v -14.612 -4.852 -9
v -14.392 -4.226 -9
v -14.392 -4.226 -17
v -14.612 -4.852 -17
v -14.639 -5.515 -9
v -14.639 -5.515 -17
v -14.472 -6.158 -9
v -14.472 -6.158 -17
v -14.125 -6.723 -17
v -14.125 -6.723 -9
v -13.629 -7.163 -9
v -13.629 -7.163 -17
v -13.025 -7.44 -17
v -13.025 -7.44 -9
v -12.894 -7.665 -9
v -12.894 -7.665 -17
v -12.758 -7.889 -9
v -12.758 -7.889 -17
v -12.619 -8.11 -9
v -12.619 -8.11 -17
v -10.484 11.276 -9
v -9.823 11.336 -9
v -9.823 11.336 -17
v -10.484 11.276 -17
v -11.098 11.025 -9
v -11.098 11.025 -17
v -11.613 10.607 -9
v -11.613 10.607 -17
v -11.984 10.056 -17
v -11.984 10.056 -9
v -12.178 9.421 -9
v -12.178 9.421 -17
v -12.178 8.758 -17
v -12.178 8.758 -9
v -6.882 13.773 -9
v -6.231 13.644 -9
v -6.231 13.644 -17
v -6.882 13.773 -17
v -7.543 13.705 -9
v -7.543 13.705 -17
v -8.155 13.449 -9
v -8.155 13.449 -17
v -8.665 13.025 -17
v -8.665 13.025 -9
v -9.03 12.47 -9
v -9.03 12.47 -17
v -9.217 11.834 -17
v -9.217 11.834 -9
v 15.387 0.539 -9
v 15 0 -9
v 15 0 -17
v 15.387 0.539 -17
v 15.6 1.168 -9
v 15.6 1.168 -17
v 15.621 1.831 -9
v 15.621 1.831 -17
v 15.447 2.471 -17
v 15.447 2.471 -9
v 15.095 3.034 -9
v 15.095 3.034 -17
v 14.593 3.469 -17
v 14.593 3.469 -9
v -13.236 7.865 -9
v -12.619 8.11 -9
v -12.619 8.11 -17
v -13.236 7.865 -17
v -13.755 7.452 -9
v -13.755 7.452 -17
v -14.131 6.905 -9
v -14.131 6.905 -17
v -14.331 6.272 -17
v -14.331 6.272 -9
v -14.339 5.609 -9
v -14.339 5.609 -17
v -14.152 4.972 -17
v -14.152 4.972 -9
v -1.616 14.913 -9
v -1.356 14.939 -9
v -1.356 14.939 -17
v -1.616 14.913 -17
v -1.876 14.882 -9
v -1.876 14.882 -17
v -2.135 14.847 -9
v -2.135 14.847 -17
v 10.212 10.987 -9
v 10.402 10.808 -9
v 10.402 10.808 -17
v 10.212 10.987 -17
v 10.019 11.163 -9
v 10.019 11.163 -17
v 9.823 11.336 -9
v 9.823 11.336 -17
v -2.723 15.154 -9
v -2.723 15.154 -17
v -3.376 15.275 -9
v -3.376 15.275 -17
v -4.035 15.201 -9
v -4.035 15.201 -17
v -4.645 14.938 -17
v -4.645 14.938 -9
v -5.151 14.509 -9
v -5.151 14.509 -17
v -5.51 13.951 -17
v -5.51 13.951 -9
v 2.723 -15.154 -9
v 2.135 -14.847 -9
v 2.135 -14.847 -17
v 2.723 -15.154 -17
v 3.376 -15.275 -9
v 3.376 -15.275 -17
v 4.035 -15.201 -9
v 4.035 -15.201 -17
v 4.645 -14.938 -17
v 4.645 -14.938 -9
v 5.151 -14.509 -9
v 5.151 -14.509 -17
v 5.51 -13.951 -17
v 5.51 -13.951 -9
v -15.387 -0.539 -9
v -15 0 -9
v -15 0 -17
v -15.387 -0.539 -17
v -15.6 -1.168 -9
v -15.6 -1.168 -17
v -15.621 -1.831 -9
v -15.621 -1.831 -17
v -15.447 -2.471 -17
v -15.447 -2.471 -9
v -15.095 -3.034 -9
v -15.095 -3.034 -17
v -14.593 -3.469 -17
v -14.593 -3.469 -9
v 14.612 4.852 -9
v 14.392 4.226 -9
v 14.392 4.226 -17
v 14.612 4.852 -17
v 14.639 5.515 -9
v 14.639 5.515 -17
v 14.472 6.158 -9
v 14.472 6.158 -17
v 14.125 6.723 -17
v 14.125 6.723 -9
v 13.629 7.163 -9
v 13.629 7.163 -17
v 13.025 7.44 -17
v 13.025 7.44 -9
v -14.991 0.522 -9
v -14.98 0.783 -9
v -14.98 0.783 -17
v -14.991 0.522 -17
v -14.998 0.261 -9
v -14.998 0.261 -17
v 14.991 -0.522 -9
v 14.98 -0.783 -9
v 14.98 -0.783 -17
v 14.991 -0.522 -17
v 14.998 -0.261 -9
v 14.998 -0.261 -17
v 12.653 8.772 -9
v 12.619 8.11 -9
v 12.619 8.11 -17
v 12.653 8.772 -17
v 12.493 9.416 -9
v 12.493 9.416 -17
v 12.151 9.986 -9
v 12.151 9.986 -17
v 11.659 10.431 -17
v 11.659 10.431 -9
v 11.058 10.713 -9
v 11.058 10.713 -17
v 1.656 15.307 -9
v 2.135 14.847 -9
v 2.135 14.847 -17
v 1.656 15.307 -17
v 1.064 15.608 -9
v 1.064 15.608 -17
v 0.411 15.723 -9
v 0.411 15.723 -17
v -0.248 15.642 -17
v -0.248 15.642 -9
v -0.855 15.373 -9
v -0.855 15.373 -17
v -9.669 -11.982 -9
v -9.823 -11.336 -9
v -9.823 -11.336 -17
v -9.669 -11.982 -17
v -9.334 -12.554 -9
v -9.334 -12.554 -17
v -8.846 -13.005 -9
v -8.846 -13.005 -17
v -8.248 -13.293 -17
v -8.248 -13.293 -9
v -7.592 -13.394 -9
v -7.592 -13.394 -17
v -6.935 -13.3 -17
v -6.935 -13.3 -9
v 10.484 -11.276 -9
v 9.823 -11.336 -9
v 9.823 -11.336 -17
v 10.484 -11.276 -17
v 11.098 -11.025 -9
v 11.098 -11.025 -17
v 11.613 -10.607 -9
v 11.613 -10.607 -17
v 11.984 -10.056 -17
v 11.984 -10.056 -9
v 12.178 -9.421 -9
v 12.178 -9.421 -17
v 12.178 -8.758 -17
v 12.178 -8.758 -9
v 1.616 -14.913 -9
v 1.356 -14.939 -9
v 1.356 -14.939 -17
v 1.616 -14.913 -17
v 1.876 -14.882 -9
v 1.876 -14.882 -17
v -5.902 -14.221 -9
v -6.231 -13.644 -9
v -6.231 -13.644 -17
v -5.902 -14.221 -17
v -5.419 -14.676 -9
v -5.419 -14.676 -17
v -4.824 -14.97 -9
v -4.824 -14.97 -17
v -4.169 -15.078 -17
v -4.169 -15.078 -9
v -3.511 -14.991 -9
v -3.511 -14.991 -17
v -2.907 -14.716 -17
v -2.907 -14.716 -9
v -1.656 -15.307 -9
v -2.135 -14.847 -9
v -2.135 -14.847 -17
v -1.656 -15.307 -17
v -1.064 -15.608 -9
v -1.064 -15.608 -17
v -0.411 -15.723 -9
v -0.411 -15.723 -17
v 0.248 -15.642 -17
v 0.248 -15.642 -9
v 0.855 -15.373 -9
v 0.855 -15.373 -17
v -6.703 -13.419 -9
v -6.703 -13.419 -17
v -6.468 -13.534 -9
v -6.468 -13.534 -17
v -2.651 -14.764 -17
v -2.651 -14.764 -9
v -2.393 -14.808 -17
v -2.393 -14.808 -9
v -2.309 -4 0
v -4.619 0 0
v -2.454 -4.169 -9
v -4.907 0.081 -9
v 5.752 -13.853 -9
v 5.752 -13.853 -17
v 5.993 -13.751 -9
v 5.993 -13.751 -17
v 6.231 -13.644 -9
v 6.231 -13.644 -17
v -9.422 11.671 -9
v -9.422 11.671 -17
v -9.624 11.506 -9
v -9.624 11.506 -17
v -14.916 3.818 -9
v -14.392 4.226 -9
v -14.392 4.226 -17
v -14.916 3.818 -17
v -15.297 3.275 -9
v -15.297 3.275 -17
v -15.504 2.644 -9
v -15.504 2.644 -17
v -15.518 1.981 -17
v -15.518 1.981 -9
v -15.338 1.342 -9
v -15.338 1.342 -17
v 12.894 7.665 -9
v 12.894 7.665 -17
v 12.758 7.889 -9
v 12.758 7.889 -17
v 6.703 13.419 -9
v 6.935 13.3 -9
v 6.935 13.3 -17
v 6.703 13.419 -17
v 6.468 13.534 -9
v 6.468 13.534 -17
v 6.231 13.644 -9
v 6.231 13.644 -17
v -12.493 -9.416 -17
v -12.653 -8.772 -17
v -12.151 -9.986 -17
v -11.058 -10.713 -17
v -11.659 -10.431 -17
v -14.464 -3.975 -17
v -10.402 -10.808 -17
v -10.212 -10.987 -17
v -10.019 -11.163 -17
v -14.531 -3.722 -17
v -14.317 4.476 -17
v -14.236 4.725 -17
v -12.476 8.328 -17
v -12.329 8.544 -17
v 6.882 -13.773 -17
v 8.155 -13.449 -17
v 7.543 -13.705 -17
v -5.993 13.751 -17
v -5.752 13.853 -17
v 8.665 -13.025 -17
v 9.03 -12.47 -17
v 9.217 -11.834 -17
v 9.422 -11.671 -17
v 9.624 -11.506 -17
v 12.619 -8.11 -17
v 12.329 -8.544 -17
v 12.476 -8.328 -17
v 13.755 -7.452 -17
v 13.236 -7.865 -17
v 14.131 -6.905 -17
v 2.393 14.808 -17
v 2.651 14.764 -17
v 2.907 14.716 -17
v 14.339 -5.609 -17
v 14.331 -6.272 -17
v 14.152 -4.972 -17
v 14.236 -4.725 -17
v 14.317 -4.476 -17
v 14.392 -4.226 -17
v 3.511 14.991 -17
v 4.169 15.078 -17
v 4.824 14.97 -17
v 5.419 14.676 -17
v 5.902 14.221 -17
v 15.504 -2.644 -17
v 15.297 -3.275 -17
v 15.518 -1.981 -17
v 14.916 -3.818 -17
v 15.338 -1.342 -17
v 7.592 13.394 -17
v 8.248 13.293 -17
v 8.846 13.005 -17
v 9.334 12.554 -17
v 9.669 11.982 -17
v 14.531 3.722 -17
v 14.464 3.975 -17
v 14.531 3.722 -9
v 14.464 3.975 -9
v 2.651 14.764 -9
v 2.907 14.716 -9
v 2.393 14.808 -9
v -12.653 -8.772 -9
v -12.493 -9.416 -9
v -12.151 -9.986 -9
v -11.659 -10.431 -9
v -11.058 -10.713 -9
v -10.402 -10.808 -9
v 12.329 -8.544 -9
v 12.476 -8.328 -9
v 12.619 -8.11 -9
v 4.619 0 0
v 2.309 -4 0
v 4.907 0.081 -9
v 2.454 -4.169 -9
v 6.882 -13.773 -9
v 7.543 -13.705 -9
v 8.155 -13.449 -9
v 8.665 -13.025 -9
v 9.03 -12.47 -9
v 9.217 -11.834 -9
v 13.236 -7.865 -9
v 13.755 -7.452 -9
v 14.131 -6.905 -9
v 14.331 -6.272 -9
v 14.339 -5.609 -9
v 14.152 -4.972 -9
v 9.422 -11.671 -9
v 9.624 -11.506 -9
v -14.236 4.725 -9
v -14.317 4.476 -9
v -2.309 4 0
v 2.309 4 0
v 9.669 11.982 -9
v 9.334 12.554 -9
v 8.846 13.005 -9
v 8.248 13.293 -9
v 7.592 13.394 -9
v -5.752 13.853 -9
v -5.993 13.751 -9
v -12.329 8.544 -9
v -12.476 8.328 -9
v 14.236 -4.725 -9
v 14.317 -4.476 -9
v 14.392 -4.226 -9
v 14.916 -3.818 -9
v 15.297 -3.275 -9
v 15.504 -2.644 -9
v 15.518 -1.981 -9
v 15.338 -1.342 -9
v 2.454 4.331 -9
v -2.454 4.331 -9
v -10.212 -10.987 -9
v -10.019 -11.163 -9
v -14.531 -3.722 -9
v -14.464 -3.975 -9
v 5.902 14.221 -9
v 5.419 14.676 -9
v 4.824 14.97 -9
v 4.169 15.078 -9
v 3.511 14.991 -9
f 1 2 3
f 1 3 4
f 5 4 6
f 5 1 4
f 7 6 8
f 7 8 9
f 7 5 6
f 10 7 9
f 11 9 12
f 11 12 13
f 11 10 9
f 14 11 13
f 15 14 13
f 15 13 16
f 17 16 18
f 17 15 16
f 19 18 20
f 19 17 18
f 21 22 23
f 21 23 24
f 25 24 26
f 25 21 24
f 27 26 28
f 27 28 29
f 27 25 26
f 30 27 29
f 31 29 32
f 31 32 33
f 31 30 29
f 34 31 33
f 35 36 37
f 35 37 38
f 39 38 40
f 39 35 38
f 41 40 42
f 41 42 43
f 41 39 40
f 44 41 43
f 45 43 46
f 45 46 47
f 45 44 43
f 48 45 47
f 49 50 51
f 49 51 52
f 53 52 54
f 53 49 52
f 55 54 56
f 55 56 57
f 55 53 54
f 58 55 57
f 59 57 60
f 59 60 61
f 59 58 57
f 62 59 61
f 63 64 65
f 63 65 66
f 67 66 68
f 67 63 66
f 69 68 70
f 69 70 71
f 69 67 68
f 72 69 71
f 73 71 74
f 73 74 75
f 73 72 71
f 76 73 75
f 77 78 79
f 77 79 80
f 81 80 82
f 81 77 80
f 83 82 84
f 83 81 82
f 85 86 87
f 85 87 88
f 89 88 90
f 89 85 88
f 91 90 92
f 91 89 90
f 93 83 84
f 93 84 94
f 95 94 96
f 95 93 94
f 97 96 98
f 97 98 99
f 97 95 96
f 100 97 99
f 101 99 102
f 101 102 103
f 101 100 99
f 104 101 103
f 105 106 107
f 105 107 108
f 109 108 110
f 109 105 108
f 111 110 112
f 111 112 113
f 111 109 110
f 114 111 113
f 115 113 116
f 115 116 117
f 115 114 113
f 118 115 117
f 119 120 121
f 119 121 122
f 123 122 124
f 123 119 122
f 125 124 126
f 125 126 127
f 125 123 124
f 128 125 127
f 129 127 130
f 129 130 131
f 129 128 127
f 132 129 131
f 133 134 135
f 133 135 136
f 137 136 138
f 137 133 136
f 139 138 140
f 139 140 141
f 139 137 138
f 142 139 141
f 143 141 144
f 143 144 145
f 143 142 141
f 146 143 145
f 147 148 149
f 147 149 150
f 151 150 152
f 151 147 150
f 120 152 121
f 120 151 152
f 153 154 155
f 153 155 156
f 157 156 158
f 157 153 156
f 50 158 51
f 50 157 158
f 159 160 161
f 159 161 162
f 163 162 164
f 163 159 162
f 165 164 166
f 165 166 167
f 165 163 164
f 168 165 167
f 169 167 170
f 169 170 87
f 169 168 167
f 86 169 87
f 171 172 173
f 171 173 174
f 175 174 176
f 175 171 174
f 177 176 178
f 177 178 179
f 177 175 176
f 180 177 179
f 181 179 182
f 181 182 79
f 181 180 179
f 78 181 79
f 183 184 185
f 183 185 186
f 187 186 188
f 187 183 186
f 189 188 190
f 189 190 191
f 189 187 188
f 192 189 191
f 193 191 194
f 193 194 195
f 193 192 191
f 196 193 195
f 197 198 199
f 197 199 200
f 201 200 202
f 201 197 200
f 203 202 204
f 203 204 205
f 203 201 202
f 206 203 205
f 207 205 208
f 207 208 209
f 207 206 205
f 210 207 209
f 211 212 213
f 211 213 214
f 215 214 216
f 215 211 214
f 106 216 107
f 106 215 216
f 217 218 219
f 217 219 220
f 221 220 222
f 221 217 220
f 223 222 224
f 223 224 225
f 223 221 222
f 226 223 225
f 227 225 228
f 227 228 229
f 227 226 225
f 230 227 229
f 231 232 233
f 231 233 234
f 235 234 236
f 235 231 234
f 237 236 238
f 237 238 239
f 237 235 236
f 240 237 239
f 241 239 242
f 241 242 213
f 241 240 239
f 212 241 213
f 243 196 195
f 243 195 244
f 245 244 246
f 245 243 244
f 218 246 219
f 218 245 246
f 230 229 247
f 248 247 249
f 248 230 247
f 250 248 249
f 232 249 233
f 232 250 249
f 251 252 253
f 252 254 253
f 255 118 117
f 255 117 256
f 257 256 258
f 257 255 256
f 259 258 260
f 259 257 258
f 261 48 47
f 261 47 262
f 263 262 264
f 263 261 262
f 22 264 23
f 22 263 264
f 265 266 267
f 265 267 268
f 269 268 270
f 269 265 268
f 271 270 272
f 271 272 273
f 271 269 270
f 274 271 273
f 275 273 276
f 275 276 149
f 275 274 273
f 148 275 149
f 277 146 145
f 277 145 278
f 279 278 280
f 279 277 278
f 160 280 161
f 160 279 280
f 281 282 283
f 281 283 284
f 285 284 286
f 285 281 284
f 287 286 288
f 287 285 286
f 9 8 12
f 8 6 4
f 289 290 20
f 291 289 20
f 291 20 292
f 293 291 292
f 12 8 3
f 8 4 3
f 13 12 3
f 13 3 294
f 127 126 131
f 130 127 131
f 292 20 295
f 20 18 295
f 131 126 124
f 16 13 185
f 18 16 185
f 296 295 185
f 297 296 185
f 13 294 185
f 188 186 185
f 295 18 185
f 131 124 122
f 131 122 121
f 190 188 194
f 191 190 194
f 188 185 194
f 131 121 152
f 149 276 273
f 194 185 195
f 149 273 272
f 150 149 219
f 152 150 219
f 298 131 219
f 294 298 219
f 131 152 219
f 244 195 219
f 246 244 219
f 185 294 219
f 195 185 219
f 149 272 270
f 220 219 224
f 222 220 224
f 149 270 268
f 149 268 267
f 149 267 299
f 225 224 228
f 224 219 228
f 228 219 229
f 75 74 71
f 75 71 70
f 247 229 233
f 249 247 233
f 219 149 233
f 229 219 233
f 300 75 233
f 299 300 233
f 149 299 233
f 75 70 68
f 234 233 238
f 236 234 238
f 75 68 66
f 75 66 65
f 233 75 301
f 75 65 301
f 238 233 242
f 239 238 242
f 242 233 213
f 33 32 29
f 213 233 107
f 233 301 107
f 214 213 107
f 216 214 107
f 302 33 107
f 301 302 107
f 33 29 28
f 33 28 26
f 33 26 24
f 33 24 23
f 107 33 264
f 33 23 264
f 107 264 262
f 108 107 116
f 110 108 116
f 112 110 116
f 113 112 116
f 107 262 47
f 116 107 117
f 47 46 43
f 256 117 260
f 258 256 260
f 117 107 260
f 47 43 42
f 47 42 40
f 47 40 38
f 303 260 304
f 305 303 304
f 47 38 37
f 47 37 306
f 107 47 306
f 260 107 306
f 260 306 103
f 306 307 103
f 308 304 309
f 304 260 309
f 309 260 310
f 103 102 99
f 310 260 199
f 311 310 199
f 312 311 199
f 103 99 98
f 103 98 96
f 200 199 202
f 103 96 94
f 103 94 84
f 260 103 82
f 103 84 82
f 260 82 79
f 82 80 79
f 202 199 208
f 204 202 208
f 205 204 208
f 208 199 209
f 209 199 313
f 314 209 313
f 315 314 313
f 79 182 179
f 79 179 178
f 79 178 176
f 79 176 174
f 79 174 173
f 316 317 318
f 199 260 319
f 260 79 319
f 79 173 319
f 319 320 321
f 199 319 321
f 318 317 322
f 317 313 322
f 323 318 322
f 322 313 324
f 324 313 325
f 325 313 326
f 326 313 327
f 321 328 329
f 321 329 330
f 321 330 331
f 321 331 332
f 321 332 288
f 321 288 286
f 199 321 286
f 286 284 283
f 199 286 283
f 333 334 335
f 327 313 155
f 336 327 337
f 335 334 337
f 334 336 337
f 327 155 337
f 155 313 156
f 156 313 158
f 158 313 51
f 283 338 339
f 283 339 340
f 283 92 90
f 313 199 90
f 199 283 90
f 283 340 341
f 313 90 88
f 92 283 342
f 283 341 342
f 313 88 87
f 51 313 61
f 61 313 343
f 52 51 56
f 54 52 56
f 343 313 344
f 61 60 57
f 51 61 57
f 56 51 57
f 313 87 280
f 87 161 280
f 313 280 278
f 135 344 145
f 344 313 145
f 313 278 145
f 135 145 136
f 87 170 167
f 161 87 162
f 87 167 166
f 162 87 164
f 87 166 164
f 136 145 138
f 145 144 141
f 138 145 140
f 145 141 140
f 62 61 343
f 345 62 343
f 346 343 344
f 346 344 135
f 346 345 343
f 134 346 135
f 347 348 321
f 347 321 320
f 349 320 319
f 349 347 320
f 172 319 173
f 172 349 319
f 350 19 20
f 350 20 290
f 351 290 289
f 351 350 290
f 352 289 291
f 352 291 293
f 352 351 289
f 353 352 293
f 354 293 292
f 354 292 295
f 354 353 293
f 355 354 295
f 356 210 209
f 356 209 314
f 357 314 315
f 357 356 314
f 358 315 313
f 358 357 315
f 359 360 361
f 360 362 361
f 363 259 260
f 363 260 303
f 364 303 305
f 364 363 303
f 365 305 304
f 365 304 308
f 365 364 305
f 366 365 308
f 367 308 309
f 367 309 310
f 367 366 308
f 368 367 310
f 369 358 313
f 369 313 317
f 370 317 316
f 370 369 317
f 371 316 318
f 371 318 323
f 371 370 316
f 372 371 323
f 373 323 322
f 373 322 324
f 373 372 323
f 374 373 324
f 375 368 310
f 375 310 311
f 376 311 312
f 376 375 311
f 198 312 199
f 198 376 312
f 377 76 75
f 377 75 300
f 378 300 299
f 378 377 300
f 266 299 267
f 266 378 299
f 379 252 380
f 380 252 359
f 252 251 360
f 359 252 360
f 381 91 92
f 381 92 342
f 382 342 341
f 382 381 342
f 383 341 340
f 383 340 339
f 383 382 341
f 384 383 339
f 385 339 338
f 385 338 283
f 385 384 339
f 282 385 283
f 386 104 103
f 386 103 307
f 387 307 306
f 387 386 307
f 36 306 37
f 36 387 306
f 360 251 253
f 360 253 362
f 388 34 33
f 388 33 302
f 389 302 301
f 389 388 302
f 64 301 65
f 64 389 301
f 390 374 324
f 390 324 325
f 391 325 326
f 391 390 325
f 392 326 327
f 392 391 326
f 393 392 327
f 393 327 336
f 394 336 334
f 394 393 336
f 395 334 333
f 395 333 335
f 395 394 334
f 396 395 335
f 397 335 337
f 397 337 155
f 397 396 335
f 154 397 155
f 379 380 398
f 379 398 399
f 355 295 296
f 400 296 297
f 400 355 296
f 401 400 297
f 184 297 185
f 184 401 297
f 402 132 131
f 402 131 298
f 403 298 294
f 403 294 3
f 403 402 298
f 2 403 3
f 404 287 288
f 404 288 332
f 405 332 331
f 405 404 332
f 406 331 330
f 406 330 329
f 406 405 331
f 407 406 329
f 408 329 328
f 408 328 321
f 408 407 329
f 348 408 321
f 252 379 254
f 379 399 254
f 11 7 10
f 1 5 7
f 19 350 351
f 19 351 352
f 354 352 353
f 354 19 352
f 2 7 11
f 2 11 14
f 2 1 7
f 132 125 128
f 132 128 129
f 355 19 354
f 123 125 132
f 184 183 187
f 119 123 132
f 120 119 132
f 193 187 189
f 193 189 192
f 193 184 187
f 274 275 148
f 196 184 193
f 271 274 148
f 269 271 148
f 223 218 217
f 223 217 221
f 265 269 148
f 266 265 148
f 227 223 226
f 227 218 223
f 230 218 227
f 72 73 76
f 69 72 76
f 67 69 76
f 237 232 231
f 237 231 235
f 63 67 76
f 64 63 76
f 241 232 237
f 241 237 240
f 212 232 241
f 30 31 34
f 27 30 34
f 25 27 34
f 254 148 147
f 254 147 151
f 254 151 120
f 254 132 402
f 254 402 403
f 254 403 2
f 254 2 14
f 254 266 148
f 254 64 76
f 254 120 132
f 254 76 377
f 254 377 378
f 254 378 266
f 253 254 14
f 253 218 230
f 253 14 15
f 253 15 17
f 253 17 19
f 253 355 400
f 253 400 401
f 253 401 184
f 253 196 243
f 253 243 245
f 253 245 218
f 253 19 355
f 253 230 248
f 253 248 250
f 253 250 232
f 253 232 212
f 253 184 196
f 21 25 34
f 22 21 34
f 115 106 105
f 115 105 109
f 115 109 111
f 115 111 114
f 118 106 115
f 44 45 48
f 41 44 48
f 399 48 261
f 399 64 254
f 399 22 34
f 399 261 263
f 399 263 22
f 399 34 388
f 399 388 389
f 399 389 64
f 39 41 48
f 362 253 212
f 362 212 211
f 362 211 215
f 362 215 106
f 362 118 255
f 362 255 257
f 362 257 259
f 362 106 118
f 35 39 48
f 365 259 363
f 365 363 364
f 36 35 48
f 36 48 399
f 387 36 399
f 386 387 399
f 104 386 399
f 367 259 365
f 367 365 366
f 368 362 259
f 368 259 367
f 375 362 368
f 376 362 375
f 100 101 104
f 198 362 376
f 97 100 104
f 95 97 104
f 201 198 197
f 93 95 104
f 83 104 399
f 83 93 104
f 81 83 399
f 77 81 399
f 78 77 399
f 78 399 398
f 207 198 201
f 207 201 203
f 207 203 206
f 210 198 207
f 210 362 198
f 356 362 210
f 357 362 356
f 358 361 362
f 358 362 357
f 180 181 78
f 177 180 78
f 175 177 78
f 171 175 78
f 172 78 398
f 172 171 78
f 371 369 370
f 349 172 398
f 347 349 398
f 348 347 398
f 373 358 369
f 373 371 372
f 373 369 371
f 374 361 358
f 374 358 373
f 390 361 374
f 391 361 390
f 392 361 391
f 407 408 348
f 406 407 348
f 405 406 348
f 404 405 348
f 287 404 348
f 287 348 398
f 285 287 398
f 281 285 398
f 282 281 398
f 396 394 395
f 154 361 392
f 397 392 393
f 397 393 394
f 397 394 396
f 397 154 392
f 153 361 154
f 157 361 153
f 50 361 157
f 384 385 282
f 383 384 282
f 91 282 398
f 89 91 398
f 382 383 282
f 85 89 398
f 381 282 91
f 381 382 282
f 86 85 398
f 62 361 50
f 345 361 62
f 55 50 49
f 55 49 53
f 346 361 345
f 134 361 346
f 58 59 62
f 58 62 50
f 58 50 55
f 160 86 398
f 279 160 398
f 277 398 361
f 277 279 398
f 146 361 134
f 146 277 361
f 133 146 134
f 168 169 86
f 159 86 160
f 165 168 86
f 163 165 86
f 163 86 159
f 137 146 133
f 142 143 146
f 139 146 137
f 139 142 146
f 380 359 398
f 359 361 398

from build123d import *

# Parameters (mm, degrees)
F3_DEPTH = 8
F4_DEPTH = 8
F5_COUNT = 22


with BuildPart() as f3:
    # F2 (on offset) → F3 (new body)
    with BuildSketch(Plane.XY.offset(-9)):
        with BuildLine():
            ThreePointArc((14.5934619862, 3.4685540585), (-14.8980188245, -1.7461486487), (15, 0))
            ThreePointArc((15, 0), (14.8980188245, 1.7461486487), (14.5934619862, 3.4685540585))
        make_face()
        Polygon((-2.4537386441, -4.1687808289), (-4.9074772881, 0.0812191711), (-2.4537386441, 4.3312191711), (2.4537386441, 4.3312191711), (4.9074772881, 0.0812191711), (2.4537386441, -4.1687808289), align=None, mode=Mode.SUBTRACT)
        Polygon((-2.4537386441, 4.3312191711), (-4.9074772881, 0.0812191711), (-2.4537386441, -4.1687808289), (2.4537386441, -4.1687808289), (4.9074772881, 0.0812191711), (2.4537386441, 4.3312191711), align=None)
    extrude(amount=-F3_DEPTH)

    # F2 (on offset) → F4 (join, through all)
    with BuildSketch(Plane.XY.offset(-9)):
        with BuildLine():
            ThreePointArc((14.5934619862, 3.4685540585), (14.8980188245, 1.7461486487), (15, 0))
            ThreePointArc((15, 0), (15.6209528999, 1.8308814158), (14.5934619862, 3.4685540585))
        make_face()
    extrude(amount=-F4_DEPTH)

    # F5: F3 ×22 about axis
    f5_axis = Axis((0, 0, -9), (0, 0, 1))


with BuildPart() as f3_1:
    add(f3.part)
    for i in range(1, F5_COUNT):
        add(f3.part.rotate(f5_axis, i * 360 / F5_COUNT))

    # F0 (on Top) → F6 section 0
    with BuildSketch(Plane.XY):
        Polygon((-4.6188021535, 0), (-2.3094010768, -4), (2.3094010768, -4), (4.6188021535, 0), (2.3094010768, 4), (-2.3094010768, 4), align=None)
    # F2 (on offset) → F6 section 1
    with BuildSketch(Plane.XY.offset(-9)):
        Polygon((-2.4537386441, 4.3312191711), (-4.9074772881, 0.0812191711), (-2.4537386441, -4.1687808289), (2.4537386441, -4.1687808289), (4.9074772881, 0.0812191711), (2.4537386441, 4.3312191711), align=None)
    loft()


solid = f3_1.part
